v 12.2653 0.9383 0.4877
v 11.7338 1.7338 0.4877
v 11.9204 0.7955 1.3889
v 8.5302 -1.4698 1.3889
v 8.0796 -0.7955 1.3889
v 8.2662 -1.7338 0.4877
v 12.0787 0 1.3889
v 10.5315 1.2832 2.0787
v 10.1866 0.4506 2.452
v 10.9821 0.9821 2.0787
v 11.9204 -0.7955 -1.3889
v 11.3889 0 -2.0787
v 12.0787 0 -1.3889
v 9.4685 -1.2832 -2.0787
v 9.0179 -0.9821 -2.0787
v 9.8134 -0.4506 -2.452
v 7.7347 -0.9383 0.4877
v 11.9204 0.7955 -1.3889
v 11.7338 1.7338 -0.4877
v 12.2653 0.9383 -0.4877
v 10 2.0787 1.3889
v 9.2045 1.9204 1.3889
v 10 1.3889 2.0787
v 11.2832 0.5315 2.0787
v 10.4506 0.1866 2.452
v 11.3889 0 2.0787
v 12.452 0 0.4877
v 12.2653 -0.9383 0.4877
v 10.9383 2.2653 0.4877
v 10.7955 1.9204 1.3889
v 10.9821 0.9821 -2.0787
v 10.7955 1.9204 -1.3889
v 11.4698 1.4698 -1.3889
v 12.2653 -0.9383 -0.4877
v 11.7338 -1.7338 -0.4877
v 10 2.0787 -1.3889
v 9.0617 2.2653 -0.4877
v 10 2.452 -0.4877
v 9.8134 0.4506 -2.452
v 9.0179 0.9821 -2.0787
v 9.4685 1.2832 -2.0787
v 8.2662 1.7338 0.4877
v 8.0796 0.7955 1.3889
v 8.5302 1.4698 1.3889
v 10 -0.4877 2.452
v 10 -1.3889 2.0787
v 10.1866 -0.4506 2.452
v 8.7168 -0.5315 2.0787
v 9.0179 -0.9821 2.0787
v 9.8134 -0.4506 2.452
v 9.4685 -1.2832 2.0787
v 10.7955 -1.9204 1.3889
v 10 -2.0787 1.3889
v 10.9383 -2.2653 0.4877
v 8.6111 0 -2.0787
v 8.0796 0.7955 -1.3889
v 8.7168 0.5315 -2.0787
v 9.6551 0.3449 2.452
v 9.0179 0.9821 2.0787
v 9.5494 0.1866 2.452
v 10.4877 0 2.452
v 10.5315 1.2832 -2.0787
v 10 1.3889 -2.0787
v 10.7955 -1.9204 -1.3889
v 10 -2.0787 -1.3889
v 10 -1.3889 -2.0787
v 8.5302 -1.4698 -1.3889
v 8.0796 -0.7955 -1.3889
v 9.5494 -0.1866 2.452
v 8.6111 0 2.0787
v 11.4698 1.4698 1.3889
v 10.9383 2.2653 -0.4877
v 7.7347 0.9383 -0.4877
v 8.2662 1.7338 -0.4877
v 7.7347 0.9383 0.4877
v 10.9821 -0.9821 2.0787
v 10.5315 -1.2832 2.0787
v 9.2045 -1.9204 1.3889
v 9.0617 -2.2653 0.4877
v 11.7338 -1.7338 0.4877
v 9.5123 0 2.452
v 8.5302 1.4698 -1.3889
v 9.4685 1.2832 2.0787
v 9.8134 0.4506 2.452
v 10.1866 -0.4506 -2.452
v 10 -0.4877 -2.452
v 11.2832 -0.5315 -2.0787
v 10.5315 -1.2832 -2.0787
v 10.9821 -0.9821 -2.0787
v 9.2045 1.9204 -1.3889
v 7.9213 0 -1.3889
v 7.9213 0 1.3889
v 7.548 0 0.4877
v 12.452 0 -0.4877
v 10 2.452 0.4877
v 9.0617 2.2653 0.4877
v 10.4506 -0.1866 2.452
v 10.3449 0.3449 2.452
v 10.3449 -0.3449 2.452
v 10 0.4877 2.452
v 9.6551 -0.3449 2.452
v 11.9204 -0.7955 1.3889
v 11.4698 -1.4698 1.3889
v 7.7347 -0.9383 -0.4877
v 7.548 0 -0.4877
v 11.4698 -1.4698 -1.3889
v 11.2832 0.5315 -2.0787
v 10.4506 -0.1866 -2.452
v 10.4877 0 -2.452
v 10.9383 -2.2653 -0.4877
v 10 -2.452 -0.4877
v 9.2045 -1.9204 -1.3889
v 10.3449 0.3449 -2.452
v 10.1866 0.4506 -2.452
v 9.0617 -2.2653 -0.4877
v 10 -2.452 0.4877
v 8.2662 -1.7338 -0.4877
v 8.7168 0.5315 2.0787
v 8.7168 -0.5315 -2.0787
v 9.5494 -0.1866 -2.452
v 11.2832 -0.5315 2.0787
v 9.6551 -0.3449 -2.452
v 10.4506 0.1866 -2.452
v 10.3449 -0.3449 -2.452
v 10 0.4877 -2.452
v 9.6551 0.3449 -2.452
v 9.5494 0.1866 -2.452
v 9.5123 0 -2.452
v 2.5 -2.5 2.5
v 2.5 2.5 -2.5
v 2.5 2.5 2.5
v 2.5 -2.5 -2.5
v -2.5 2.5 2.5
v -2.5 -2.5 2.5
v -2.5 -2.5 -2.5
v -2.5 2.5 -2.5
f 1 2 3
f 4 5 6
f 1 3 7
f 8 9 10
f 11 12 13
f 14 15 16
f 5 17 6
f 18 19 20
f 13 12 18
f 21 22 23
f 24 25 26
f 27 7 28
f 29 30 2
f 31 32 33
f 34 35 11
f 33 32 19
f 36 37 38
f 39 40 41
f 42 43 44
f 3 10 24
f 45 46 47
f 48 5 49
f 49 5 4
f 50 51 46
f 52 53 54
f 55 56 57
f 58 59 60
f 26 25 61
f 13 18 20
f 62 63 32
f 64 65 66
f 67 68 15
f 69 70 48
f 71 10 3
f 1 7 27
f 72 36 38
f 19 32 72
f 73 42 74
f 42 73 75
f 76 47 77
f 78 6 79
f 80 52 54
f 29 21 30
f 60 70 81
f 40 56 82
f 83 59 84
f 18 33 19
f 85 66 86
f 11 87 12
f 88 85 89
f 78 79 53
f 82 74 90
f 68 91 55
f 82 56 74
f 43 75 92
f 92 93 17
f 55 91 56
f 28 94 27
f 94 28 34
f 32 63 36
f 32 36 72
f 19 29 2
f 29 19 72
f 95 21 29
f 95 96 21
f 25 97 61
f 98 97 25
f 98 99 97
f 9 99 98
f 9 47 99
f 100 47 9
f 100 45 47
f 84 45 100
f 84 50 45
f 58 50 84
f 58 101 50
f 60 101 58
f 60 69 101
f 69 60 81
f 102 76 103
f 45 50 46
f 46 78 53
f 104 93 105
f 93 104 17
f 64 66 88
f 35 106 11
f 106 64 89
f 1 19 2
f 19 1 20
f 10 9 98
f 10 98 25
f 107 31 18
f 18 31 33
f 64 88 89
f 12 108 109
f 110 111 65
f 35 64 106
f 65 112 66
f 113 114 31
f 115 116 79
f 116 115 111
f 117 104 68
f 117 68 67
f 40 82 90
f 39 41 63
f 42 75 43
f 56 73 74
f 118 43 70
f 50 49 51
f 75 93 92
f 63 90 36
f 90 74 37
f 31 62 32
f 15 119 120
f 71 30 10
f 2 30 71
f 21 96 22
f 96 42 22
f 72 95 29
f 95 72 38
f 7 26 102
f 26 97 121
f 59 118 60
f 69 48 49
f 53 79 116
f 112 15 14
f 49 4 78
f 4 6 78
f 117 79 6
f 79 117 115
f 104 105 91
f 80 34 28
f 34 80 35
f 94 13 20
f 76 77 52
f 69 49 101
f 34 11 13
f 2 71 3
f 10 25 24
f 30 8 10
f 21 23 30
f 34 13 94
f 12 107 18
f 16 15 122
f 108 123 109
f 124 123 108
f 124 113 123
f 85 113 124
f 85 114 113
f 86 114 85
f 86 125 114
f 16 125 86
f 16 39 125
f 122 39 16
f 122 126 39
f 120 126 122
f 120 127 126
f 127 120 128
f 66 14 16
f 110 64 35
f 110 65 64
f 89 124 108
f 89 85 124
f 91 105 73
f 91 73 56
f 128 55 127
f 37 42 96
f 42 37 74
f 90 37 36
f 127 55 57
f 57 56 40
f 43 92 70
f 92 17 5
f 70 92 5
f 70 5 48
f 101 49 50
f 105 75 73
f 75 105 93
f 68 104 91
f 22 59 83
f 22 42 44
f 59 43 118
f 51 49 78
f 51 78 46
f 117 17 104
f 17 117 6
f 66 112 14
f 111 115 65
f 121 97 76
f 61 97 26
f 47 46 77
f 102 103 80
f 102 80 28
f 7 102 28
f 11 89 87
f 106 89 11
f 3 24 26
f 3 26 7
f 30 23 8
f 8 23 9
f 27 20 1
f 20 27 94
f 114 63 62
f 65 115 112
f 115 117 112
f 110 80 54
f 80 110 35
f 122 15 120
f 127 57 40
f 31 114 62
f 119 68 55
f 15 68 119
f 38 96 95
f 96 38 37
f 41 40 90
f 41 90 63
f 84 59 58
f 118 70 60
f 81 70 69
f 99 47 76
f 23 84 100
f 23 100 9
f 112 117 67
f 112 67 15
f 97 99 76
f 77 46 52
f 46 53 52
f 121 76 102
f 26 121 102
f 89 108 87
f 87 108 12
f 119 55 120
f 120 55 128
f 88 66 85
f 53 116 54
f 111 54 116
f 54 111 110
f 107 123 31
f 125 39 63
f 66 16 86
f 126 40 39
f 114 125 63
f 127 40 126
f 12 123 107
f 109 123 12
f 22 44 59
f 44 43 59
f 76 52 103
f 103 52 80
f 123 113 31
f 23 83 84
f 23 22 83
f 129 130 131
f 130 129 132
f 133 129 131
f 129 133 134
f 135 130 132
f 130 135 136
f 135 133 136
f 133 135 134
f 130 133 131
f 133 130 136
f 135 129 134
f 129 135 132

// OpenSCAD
// Use high-quality rendering when running from scadr
$fn = 180;

// Use a 'demo' module (naming doesn't matter)
// for previewing / development
demo();
module demo() {
    // use low-quality rendering for development purposes
    $fn = undef;
    $fa = 15;
    $fs = 1;

    translate([10, 0, 0]) {
        Ball();
    }
    Box();
}

// Top-level modules starting with a capital letter are rendered to STL

// This will produce demo-Ball.stl
module Ball() {
    sphere(d = 5);
}

// This will produce demo-Box.stl
module Box() {
    cube([5, 5, 5], center = true);
}
